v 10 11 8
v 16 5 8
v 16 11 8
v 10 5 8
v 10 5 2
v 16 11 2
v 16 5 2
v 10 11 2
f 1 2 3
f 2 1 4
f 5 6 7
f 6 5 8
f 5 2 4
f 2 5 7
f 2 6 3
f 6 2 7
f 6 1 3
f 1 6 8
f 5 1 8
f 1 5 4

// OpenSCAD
// Construct: translate() moving a solid off the origin.
translate([10, 5, 2]) cube(6);
